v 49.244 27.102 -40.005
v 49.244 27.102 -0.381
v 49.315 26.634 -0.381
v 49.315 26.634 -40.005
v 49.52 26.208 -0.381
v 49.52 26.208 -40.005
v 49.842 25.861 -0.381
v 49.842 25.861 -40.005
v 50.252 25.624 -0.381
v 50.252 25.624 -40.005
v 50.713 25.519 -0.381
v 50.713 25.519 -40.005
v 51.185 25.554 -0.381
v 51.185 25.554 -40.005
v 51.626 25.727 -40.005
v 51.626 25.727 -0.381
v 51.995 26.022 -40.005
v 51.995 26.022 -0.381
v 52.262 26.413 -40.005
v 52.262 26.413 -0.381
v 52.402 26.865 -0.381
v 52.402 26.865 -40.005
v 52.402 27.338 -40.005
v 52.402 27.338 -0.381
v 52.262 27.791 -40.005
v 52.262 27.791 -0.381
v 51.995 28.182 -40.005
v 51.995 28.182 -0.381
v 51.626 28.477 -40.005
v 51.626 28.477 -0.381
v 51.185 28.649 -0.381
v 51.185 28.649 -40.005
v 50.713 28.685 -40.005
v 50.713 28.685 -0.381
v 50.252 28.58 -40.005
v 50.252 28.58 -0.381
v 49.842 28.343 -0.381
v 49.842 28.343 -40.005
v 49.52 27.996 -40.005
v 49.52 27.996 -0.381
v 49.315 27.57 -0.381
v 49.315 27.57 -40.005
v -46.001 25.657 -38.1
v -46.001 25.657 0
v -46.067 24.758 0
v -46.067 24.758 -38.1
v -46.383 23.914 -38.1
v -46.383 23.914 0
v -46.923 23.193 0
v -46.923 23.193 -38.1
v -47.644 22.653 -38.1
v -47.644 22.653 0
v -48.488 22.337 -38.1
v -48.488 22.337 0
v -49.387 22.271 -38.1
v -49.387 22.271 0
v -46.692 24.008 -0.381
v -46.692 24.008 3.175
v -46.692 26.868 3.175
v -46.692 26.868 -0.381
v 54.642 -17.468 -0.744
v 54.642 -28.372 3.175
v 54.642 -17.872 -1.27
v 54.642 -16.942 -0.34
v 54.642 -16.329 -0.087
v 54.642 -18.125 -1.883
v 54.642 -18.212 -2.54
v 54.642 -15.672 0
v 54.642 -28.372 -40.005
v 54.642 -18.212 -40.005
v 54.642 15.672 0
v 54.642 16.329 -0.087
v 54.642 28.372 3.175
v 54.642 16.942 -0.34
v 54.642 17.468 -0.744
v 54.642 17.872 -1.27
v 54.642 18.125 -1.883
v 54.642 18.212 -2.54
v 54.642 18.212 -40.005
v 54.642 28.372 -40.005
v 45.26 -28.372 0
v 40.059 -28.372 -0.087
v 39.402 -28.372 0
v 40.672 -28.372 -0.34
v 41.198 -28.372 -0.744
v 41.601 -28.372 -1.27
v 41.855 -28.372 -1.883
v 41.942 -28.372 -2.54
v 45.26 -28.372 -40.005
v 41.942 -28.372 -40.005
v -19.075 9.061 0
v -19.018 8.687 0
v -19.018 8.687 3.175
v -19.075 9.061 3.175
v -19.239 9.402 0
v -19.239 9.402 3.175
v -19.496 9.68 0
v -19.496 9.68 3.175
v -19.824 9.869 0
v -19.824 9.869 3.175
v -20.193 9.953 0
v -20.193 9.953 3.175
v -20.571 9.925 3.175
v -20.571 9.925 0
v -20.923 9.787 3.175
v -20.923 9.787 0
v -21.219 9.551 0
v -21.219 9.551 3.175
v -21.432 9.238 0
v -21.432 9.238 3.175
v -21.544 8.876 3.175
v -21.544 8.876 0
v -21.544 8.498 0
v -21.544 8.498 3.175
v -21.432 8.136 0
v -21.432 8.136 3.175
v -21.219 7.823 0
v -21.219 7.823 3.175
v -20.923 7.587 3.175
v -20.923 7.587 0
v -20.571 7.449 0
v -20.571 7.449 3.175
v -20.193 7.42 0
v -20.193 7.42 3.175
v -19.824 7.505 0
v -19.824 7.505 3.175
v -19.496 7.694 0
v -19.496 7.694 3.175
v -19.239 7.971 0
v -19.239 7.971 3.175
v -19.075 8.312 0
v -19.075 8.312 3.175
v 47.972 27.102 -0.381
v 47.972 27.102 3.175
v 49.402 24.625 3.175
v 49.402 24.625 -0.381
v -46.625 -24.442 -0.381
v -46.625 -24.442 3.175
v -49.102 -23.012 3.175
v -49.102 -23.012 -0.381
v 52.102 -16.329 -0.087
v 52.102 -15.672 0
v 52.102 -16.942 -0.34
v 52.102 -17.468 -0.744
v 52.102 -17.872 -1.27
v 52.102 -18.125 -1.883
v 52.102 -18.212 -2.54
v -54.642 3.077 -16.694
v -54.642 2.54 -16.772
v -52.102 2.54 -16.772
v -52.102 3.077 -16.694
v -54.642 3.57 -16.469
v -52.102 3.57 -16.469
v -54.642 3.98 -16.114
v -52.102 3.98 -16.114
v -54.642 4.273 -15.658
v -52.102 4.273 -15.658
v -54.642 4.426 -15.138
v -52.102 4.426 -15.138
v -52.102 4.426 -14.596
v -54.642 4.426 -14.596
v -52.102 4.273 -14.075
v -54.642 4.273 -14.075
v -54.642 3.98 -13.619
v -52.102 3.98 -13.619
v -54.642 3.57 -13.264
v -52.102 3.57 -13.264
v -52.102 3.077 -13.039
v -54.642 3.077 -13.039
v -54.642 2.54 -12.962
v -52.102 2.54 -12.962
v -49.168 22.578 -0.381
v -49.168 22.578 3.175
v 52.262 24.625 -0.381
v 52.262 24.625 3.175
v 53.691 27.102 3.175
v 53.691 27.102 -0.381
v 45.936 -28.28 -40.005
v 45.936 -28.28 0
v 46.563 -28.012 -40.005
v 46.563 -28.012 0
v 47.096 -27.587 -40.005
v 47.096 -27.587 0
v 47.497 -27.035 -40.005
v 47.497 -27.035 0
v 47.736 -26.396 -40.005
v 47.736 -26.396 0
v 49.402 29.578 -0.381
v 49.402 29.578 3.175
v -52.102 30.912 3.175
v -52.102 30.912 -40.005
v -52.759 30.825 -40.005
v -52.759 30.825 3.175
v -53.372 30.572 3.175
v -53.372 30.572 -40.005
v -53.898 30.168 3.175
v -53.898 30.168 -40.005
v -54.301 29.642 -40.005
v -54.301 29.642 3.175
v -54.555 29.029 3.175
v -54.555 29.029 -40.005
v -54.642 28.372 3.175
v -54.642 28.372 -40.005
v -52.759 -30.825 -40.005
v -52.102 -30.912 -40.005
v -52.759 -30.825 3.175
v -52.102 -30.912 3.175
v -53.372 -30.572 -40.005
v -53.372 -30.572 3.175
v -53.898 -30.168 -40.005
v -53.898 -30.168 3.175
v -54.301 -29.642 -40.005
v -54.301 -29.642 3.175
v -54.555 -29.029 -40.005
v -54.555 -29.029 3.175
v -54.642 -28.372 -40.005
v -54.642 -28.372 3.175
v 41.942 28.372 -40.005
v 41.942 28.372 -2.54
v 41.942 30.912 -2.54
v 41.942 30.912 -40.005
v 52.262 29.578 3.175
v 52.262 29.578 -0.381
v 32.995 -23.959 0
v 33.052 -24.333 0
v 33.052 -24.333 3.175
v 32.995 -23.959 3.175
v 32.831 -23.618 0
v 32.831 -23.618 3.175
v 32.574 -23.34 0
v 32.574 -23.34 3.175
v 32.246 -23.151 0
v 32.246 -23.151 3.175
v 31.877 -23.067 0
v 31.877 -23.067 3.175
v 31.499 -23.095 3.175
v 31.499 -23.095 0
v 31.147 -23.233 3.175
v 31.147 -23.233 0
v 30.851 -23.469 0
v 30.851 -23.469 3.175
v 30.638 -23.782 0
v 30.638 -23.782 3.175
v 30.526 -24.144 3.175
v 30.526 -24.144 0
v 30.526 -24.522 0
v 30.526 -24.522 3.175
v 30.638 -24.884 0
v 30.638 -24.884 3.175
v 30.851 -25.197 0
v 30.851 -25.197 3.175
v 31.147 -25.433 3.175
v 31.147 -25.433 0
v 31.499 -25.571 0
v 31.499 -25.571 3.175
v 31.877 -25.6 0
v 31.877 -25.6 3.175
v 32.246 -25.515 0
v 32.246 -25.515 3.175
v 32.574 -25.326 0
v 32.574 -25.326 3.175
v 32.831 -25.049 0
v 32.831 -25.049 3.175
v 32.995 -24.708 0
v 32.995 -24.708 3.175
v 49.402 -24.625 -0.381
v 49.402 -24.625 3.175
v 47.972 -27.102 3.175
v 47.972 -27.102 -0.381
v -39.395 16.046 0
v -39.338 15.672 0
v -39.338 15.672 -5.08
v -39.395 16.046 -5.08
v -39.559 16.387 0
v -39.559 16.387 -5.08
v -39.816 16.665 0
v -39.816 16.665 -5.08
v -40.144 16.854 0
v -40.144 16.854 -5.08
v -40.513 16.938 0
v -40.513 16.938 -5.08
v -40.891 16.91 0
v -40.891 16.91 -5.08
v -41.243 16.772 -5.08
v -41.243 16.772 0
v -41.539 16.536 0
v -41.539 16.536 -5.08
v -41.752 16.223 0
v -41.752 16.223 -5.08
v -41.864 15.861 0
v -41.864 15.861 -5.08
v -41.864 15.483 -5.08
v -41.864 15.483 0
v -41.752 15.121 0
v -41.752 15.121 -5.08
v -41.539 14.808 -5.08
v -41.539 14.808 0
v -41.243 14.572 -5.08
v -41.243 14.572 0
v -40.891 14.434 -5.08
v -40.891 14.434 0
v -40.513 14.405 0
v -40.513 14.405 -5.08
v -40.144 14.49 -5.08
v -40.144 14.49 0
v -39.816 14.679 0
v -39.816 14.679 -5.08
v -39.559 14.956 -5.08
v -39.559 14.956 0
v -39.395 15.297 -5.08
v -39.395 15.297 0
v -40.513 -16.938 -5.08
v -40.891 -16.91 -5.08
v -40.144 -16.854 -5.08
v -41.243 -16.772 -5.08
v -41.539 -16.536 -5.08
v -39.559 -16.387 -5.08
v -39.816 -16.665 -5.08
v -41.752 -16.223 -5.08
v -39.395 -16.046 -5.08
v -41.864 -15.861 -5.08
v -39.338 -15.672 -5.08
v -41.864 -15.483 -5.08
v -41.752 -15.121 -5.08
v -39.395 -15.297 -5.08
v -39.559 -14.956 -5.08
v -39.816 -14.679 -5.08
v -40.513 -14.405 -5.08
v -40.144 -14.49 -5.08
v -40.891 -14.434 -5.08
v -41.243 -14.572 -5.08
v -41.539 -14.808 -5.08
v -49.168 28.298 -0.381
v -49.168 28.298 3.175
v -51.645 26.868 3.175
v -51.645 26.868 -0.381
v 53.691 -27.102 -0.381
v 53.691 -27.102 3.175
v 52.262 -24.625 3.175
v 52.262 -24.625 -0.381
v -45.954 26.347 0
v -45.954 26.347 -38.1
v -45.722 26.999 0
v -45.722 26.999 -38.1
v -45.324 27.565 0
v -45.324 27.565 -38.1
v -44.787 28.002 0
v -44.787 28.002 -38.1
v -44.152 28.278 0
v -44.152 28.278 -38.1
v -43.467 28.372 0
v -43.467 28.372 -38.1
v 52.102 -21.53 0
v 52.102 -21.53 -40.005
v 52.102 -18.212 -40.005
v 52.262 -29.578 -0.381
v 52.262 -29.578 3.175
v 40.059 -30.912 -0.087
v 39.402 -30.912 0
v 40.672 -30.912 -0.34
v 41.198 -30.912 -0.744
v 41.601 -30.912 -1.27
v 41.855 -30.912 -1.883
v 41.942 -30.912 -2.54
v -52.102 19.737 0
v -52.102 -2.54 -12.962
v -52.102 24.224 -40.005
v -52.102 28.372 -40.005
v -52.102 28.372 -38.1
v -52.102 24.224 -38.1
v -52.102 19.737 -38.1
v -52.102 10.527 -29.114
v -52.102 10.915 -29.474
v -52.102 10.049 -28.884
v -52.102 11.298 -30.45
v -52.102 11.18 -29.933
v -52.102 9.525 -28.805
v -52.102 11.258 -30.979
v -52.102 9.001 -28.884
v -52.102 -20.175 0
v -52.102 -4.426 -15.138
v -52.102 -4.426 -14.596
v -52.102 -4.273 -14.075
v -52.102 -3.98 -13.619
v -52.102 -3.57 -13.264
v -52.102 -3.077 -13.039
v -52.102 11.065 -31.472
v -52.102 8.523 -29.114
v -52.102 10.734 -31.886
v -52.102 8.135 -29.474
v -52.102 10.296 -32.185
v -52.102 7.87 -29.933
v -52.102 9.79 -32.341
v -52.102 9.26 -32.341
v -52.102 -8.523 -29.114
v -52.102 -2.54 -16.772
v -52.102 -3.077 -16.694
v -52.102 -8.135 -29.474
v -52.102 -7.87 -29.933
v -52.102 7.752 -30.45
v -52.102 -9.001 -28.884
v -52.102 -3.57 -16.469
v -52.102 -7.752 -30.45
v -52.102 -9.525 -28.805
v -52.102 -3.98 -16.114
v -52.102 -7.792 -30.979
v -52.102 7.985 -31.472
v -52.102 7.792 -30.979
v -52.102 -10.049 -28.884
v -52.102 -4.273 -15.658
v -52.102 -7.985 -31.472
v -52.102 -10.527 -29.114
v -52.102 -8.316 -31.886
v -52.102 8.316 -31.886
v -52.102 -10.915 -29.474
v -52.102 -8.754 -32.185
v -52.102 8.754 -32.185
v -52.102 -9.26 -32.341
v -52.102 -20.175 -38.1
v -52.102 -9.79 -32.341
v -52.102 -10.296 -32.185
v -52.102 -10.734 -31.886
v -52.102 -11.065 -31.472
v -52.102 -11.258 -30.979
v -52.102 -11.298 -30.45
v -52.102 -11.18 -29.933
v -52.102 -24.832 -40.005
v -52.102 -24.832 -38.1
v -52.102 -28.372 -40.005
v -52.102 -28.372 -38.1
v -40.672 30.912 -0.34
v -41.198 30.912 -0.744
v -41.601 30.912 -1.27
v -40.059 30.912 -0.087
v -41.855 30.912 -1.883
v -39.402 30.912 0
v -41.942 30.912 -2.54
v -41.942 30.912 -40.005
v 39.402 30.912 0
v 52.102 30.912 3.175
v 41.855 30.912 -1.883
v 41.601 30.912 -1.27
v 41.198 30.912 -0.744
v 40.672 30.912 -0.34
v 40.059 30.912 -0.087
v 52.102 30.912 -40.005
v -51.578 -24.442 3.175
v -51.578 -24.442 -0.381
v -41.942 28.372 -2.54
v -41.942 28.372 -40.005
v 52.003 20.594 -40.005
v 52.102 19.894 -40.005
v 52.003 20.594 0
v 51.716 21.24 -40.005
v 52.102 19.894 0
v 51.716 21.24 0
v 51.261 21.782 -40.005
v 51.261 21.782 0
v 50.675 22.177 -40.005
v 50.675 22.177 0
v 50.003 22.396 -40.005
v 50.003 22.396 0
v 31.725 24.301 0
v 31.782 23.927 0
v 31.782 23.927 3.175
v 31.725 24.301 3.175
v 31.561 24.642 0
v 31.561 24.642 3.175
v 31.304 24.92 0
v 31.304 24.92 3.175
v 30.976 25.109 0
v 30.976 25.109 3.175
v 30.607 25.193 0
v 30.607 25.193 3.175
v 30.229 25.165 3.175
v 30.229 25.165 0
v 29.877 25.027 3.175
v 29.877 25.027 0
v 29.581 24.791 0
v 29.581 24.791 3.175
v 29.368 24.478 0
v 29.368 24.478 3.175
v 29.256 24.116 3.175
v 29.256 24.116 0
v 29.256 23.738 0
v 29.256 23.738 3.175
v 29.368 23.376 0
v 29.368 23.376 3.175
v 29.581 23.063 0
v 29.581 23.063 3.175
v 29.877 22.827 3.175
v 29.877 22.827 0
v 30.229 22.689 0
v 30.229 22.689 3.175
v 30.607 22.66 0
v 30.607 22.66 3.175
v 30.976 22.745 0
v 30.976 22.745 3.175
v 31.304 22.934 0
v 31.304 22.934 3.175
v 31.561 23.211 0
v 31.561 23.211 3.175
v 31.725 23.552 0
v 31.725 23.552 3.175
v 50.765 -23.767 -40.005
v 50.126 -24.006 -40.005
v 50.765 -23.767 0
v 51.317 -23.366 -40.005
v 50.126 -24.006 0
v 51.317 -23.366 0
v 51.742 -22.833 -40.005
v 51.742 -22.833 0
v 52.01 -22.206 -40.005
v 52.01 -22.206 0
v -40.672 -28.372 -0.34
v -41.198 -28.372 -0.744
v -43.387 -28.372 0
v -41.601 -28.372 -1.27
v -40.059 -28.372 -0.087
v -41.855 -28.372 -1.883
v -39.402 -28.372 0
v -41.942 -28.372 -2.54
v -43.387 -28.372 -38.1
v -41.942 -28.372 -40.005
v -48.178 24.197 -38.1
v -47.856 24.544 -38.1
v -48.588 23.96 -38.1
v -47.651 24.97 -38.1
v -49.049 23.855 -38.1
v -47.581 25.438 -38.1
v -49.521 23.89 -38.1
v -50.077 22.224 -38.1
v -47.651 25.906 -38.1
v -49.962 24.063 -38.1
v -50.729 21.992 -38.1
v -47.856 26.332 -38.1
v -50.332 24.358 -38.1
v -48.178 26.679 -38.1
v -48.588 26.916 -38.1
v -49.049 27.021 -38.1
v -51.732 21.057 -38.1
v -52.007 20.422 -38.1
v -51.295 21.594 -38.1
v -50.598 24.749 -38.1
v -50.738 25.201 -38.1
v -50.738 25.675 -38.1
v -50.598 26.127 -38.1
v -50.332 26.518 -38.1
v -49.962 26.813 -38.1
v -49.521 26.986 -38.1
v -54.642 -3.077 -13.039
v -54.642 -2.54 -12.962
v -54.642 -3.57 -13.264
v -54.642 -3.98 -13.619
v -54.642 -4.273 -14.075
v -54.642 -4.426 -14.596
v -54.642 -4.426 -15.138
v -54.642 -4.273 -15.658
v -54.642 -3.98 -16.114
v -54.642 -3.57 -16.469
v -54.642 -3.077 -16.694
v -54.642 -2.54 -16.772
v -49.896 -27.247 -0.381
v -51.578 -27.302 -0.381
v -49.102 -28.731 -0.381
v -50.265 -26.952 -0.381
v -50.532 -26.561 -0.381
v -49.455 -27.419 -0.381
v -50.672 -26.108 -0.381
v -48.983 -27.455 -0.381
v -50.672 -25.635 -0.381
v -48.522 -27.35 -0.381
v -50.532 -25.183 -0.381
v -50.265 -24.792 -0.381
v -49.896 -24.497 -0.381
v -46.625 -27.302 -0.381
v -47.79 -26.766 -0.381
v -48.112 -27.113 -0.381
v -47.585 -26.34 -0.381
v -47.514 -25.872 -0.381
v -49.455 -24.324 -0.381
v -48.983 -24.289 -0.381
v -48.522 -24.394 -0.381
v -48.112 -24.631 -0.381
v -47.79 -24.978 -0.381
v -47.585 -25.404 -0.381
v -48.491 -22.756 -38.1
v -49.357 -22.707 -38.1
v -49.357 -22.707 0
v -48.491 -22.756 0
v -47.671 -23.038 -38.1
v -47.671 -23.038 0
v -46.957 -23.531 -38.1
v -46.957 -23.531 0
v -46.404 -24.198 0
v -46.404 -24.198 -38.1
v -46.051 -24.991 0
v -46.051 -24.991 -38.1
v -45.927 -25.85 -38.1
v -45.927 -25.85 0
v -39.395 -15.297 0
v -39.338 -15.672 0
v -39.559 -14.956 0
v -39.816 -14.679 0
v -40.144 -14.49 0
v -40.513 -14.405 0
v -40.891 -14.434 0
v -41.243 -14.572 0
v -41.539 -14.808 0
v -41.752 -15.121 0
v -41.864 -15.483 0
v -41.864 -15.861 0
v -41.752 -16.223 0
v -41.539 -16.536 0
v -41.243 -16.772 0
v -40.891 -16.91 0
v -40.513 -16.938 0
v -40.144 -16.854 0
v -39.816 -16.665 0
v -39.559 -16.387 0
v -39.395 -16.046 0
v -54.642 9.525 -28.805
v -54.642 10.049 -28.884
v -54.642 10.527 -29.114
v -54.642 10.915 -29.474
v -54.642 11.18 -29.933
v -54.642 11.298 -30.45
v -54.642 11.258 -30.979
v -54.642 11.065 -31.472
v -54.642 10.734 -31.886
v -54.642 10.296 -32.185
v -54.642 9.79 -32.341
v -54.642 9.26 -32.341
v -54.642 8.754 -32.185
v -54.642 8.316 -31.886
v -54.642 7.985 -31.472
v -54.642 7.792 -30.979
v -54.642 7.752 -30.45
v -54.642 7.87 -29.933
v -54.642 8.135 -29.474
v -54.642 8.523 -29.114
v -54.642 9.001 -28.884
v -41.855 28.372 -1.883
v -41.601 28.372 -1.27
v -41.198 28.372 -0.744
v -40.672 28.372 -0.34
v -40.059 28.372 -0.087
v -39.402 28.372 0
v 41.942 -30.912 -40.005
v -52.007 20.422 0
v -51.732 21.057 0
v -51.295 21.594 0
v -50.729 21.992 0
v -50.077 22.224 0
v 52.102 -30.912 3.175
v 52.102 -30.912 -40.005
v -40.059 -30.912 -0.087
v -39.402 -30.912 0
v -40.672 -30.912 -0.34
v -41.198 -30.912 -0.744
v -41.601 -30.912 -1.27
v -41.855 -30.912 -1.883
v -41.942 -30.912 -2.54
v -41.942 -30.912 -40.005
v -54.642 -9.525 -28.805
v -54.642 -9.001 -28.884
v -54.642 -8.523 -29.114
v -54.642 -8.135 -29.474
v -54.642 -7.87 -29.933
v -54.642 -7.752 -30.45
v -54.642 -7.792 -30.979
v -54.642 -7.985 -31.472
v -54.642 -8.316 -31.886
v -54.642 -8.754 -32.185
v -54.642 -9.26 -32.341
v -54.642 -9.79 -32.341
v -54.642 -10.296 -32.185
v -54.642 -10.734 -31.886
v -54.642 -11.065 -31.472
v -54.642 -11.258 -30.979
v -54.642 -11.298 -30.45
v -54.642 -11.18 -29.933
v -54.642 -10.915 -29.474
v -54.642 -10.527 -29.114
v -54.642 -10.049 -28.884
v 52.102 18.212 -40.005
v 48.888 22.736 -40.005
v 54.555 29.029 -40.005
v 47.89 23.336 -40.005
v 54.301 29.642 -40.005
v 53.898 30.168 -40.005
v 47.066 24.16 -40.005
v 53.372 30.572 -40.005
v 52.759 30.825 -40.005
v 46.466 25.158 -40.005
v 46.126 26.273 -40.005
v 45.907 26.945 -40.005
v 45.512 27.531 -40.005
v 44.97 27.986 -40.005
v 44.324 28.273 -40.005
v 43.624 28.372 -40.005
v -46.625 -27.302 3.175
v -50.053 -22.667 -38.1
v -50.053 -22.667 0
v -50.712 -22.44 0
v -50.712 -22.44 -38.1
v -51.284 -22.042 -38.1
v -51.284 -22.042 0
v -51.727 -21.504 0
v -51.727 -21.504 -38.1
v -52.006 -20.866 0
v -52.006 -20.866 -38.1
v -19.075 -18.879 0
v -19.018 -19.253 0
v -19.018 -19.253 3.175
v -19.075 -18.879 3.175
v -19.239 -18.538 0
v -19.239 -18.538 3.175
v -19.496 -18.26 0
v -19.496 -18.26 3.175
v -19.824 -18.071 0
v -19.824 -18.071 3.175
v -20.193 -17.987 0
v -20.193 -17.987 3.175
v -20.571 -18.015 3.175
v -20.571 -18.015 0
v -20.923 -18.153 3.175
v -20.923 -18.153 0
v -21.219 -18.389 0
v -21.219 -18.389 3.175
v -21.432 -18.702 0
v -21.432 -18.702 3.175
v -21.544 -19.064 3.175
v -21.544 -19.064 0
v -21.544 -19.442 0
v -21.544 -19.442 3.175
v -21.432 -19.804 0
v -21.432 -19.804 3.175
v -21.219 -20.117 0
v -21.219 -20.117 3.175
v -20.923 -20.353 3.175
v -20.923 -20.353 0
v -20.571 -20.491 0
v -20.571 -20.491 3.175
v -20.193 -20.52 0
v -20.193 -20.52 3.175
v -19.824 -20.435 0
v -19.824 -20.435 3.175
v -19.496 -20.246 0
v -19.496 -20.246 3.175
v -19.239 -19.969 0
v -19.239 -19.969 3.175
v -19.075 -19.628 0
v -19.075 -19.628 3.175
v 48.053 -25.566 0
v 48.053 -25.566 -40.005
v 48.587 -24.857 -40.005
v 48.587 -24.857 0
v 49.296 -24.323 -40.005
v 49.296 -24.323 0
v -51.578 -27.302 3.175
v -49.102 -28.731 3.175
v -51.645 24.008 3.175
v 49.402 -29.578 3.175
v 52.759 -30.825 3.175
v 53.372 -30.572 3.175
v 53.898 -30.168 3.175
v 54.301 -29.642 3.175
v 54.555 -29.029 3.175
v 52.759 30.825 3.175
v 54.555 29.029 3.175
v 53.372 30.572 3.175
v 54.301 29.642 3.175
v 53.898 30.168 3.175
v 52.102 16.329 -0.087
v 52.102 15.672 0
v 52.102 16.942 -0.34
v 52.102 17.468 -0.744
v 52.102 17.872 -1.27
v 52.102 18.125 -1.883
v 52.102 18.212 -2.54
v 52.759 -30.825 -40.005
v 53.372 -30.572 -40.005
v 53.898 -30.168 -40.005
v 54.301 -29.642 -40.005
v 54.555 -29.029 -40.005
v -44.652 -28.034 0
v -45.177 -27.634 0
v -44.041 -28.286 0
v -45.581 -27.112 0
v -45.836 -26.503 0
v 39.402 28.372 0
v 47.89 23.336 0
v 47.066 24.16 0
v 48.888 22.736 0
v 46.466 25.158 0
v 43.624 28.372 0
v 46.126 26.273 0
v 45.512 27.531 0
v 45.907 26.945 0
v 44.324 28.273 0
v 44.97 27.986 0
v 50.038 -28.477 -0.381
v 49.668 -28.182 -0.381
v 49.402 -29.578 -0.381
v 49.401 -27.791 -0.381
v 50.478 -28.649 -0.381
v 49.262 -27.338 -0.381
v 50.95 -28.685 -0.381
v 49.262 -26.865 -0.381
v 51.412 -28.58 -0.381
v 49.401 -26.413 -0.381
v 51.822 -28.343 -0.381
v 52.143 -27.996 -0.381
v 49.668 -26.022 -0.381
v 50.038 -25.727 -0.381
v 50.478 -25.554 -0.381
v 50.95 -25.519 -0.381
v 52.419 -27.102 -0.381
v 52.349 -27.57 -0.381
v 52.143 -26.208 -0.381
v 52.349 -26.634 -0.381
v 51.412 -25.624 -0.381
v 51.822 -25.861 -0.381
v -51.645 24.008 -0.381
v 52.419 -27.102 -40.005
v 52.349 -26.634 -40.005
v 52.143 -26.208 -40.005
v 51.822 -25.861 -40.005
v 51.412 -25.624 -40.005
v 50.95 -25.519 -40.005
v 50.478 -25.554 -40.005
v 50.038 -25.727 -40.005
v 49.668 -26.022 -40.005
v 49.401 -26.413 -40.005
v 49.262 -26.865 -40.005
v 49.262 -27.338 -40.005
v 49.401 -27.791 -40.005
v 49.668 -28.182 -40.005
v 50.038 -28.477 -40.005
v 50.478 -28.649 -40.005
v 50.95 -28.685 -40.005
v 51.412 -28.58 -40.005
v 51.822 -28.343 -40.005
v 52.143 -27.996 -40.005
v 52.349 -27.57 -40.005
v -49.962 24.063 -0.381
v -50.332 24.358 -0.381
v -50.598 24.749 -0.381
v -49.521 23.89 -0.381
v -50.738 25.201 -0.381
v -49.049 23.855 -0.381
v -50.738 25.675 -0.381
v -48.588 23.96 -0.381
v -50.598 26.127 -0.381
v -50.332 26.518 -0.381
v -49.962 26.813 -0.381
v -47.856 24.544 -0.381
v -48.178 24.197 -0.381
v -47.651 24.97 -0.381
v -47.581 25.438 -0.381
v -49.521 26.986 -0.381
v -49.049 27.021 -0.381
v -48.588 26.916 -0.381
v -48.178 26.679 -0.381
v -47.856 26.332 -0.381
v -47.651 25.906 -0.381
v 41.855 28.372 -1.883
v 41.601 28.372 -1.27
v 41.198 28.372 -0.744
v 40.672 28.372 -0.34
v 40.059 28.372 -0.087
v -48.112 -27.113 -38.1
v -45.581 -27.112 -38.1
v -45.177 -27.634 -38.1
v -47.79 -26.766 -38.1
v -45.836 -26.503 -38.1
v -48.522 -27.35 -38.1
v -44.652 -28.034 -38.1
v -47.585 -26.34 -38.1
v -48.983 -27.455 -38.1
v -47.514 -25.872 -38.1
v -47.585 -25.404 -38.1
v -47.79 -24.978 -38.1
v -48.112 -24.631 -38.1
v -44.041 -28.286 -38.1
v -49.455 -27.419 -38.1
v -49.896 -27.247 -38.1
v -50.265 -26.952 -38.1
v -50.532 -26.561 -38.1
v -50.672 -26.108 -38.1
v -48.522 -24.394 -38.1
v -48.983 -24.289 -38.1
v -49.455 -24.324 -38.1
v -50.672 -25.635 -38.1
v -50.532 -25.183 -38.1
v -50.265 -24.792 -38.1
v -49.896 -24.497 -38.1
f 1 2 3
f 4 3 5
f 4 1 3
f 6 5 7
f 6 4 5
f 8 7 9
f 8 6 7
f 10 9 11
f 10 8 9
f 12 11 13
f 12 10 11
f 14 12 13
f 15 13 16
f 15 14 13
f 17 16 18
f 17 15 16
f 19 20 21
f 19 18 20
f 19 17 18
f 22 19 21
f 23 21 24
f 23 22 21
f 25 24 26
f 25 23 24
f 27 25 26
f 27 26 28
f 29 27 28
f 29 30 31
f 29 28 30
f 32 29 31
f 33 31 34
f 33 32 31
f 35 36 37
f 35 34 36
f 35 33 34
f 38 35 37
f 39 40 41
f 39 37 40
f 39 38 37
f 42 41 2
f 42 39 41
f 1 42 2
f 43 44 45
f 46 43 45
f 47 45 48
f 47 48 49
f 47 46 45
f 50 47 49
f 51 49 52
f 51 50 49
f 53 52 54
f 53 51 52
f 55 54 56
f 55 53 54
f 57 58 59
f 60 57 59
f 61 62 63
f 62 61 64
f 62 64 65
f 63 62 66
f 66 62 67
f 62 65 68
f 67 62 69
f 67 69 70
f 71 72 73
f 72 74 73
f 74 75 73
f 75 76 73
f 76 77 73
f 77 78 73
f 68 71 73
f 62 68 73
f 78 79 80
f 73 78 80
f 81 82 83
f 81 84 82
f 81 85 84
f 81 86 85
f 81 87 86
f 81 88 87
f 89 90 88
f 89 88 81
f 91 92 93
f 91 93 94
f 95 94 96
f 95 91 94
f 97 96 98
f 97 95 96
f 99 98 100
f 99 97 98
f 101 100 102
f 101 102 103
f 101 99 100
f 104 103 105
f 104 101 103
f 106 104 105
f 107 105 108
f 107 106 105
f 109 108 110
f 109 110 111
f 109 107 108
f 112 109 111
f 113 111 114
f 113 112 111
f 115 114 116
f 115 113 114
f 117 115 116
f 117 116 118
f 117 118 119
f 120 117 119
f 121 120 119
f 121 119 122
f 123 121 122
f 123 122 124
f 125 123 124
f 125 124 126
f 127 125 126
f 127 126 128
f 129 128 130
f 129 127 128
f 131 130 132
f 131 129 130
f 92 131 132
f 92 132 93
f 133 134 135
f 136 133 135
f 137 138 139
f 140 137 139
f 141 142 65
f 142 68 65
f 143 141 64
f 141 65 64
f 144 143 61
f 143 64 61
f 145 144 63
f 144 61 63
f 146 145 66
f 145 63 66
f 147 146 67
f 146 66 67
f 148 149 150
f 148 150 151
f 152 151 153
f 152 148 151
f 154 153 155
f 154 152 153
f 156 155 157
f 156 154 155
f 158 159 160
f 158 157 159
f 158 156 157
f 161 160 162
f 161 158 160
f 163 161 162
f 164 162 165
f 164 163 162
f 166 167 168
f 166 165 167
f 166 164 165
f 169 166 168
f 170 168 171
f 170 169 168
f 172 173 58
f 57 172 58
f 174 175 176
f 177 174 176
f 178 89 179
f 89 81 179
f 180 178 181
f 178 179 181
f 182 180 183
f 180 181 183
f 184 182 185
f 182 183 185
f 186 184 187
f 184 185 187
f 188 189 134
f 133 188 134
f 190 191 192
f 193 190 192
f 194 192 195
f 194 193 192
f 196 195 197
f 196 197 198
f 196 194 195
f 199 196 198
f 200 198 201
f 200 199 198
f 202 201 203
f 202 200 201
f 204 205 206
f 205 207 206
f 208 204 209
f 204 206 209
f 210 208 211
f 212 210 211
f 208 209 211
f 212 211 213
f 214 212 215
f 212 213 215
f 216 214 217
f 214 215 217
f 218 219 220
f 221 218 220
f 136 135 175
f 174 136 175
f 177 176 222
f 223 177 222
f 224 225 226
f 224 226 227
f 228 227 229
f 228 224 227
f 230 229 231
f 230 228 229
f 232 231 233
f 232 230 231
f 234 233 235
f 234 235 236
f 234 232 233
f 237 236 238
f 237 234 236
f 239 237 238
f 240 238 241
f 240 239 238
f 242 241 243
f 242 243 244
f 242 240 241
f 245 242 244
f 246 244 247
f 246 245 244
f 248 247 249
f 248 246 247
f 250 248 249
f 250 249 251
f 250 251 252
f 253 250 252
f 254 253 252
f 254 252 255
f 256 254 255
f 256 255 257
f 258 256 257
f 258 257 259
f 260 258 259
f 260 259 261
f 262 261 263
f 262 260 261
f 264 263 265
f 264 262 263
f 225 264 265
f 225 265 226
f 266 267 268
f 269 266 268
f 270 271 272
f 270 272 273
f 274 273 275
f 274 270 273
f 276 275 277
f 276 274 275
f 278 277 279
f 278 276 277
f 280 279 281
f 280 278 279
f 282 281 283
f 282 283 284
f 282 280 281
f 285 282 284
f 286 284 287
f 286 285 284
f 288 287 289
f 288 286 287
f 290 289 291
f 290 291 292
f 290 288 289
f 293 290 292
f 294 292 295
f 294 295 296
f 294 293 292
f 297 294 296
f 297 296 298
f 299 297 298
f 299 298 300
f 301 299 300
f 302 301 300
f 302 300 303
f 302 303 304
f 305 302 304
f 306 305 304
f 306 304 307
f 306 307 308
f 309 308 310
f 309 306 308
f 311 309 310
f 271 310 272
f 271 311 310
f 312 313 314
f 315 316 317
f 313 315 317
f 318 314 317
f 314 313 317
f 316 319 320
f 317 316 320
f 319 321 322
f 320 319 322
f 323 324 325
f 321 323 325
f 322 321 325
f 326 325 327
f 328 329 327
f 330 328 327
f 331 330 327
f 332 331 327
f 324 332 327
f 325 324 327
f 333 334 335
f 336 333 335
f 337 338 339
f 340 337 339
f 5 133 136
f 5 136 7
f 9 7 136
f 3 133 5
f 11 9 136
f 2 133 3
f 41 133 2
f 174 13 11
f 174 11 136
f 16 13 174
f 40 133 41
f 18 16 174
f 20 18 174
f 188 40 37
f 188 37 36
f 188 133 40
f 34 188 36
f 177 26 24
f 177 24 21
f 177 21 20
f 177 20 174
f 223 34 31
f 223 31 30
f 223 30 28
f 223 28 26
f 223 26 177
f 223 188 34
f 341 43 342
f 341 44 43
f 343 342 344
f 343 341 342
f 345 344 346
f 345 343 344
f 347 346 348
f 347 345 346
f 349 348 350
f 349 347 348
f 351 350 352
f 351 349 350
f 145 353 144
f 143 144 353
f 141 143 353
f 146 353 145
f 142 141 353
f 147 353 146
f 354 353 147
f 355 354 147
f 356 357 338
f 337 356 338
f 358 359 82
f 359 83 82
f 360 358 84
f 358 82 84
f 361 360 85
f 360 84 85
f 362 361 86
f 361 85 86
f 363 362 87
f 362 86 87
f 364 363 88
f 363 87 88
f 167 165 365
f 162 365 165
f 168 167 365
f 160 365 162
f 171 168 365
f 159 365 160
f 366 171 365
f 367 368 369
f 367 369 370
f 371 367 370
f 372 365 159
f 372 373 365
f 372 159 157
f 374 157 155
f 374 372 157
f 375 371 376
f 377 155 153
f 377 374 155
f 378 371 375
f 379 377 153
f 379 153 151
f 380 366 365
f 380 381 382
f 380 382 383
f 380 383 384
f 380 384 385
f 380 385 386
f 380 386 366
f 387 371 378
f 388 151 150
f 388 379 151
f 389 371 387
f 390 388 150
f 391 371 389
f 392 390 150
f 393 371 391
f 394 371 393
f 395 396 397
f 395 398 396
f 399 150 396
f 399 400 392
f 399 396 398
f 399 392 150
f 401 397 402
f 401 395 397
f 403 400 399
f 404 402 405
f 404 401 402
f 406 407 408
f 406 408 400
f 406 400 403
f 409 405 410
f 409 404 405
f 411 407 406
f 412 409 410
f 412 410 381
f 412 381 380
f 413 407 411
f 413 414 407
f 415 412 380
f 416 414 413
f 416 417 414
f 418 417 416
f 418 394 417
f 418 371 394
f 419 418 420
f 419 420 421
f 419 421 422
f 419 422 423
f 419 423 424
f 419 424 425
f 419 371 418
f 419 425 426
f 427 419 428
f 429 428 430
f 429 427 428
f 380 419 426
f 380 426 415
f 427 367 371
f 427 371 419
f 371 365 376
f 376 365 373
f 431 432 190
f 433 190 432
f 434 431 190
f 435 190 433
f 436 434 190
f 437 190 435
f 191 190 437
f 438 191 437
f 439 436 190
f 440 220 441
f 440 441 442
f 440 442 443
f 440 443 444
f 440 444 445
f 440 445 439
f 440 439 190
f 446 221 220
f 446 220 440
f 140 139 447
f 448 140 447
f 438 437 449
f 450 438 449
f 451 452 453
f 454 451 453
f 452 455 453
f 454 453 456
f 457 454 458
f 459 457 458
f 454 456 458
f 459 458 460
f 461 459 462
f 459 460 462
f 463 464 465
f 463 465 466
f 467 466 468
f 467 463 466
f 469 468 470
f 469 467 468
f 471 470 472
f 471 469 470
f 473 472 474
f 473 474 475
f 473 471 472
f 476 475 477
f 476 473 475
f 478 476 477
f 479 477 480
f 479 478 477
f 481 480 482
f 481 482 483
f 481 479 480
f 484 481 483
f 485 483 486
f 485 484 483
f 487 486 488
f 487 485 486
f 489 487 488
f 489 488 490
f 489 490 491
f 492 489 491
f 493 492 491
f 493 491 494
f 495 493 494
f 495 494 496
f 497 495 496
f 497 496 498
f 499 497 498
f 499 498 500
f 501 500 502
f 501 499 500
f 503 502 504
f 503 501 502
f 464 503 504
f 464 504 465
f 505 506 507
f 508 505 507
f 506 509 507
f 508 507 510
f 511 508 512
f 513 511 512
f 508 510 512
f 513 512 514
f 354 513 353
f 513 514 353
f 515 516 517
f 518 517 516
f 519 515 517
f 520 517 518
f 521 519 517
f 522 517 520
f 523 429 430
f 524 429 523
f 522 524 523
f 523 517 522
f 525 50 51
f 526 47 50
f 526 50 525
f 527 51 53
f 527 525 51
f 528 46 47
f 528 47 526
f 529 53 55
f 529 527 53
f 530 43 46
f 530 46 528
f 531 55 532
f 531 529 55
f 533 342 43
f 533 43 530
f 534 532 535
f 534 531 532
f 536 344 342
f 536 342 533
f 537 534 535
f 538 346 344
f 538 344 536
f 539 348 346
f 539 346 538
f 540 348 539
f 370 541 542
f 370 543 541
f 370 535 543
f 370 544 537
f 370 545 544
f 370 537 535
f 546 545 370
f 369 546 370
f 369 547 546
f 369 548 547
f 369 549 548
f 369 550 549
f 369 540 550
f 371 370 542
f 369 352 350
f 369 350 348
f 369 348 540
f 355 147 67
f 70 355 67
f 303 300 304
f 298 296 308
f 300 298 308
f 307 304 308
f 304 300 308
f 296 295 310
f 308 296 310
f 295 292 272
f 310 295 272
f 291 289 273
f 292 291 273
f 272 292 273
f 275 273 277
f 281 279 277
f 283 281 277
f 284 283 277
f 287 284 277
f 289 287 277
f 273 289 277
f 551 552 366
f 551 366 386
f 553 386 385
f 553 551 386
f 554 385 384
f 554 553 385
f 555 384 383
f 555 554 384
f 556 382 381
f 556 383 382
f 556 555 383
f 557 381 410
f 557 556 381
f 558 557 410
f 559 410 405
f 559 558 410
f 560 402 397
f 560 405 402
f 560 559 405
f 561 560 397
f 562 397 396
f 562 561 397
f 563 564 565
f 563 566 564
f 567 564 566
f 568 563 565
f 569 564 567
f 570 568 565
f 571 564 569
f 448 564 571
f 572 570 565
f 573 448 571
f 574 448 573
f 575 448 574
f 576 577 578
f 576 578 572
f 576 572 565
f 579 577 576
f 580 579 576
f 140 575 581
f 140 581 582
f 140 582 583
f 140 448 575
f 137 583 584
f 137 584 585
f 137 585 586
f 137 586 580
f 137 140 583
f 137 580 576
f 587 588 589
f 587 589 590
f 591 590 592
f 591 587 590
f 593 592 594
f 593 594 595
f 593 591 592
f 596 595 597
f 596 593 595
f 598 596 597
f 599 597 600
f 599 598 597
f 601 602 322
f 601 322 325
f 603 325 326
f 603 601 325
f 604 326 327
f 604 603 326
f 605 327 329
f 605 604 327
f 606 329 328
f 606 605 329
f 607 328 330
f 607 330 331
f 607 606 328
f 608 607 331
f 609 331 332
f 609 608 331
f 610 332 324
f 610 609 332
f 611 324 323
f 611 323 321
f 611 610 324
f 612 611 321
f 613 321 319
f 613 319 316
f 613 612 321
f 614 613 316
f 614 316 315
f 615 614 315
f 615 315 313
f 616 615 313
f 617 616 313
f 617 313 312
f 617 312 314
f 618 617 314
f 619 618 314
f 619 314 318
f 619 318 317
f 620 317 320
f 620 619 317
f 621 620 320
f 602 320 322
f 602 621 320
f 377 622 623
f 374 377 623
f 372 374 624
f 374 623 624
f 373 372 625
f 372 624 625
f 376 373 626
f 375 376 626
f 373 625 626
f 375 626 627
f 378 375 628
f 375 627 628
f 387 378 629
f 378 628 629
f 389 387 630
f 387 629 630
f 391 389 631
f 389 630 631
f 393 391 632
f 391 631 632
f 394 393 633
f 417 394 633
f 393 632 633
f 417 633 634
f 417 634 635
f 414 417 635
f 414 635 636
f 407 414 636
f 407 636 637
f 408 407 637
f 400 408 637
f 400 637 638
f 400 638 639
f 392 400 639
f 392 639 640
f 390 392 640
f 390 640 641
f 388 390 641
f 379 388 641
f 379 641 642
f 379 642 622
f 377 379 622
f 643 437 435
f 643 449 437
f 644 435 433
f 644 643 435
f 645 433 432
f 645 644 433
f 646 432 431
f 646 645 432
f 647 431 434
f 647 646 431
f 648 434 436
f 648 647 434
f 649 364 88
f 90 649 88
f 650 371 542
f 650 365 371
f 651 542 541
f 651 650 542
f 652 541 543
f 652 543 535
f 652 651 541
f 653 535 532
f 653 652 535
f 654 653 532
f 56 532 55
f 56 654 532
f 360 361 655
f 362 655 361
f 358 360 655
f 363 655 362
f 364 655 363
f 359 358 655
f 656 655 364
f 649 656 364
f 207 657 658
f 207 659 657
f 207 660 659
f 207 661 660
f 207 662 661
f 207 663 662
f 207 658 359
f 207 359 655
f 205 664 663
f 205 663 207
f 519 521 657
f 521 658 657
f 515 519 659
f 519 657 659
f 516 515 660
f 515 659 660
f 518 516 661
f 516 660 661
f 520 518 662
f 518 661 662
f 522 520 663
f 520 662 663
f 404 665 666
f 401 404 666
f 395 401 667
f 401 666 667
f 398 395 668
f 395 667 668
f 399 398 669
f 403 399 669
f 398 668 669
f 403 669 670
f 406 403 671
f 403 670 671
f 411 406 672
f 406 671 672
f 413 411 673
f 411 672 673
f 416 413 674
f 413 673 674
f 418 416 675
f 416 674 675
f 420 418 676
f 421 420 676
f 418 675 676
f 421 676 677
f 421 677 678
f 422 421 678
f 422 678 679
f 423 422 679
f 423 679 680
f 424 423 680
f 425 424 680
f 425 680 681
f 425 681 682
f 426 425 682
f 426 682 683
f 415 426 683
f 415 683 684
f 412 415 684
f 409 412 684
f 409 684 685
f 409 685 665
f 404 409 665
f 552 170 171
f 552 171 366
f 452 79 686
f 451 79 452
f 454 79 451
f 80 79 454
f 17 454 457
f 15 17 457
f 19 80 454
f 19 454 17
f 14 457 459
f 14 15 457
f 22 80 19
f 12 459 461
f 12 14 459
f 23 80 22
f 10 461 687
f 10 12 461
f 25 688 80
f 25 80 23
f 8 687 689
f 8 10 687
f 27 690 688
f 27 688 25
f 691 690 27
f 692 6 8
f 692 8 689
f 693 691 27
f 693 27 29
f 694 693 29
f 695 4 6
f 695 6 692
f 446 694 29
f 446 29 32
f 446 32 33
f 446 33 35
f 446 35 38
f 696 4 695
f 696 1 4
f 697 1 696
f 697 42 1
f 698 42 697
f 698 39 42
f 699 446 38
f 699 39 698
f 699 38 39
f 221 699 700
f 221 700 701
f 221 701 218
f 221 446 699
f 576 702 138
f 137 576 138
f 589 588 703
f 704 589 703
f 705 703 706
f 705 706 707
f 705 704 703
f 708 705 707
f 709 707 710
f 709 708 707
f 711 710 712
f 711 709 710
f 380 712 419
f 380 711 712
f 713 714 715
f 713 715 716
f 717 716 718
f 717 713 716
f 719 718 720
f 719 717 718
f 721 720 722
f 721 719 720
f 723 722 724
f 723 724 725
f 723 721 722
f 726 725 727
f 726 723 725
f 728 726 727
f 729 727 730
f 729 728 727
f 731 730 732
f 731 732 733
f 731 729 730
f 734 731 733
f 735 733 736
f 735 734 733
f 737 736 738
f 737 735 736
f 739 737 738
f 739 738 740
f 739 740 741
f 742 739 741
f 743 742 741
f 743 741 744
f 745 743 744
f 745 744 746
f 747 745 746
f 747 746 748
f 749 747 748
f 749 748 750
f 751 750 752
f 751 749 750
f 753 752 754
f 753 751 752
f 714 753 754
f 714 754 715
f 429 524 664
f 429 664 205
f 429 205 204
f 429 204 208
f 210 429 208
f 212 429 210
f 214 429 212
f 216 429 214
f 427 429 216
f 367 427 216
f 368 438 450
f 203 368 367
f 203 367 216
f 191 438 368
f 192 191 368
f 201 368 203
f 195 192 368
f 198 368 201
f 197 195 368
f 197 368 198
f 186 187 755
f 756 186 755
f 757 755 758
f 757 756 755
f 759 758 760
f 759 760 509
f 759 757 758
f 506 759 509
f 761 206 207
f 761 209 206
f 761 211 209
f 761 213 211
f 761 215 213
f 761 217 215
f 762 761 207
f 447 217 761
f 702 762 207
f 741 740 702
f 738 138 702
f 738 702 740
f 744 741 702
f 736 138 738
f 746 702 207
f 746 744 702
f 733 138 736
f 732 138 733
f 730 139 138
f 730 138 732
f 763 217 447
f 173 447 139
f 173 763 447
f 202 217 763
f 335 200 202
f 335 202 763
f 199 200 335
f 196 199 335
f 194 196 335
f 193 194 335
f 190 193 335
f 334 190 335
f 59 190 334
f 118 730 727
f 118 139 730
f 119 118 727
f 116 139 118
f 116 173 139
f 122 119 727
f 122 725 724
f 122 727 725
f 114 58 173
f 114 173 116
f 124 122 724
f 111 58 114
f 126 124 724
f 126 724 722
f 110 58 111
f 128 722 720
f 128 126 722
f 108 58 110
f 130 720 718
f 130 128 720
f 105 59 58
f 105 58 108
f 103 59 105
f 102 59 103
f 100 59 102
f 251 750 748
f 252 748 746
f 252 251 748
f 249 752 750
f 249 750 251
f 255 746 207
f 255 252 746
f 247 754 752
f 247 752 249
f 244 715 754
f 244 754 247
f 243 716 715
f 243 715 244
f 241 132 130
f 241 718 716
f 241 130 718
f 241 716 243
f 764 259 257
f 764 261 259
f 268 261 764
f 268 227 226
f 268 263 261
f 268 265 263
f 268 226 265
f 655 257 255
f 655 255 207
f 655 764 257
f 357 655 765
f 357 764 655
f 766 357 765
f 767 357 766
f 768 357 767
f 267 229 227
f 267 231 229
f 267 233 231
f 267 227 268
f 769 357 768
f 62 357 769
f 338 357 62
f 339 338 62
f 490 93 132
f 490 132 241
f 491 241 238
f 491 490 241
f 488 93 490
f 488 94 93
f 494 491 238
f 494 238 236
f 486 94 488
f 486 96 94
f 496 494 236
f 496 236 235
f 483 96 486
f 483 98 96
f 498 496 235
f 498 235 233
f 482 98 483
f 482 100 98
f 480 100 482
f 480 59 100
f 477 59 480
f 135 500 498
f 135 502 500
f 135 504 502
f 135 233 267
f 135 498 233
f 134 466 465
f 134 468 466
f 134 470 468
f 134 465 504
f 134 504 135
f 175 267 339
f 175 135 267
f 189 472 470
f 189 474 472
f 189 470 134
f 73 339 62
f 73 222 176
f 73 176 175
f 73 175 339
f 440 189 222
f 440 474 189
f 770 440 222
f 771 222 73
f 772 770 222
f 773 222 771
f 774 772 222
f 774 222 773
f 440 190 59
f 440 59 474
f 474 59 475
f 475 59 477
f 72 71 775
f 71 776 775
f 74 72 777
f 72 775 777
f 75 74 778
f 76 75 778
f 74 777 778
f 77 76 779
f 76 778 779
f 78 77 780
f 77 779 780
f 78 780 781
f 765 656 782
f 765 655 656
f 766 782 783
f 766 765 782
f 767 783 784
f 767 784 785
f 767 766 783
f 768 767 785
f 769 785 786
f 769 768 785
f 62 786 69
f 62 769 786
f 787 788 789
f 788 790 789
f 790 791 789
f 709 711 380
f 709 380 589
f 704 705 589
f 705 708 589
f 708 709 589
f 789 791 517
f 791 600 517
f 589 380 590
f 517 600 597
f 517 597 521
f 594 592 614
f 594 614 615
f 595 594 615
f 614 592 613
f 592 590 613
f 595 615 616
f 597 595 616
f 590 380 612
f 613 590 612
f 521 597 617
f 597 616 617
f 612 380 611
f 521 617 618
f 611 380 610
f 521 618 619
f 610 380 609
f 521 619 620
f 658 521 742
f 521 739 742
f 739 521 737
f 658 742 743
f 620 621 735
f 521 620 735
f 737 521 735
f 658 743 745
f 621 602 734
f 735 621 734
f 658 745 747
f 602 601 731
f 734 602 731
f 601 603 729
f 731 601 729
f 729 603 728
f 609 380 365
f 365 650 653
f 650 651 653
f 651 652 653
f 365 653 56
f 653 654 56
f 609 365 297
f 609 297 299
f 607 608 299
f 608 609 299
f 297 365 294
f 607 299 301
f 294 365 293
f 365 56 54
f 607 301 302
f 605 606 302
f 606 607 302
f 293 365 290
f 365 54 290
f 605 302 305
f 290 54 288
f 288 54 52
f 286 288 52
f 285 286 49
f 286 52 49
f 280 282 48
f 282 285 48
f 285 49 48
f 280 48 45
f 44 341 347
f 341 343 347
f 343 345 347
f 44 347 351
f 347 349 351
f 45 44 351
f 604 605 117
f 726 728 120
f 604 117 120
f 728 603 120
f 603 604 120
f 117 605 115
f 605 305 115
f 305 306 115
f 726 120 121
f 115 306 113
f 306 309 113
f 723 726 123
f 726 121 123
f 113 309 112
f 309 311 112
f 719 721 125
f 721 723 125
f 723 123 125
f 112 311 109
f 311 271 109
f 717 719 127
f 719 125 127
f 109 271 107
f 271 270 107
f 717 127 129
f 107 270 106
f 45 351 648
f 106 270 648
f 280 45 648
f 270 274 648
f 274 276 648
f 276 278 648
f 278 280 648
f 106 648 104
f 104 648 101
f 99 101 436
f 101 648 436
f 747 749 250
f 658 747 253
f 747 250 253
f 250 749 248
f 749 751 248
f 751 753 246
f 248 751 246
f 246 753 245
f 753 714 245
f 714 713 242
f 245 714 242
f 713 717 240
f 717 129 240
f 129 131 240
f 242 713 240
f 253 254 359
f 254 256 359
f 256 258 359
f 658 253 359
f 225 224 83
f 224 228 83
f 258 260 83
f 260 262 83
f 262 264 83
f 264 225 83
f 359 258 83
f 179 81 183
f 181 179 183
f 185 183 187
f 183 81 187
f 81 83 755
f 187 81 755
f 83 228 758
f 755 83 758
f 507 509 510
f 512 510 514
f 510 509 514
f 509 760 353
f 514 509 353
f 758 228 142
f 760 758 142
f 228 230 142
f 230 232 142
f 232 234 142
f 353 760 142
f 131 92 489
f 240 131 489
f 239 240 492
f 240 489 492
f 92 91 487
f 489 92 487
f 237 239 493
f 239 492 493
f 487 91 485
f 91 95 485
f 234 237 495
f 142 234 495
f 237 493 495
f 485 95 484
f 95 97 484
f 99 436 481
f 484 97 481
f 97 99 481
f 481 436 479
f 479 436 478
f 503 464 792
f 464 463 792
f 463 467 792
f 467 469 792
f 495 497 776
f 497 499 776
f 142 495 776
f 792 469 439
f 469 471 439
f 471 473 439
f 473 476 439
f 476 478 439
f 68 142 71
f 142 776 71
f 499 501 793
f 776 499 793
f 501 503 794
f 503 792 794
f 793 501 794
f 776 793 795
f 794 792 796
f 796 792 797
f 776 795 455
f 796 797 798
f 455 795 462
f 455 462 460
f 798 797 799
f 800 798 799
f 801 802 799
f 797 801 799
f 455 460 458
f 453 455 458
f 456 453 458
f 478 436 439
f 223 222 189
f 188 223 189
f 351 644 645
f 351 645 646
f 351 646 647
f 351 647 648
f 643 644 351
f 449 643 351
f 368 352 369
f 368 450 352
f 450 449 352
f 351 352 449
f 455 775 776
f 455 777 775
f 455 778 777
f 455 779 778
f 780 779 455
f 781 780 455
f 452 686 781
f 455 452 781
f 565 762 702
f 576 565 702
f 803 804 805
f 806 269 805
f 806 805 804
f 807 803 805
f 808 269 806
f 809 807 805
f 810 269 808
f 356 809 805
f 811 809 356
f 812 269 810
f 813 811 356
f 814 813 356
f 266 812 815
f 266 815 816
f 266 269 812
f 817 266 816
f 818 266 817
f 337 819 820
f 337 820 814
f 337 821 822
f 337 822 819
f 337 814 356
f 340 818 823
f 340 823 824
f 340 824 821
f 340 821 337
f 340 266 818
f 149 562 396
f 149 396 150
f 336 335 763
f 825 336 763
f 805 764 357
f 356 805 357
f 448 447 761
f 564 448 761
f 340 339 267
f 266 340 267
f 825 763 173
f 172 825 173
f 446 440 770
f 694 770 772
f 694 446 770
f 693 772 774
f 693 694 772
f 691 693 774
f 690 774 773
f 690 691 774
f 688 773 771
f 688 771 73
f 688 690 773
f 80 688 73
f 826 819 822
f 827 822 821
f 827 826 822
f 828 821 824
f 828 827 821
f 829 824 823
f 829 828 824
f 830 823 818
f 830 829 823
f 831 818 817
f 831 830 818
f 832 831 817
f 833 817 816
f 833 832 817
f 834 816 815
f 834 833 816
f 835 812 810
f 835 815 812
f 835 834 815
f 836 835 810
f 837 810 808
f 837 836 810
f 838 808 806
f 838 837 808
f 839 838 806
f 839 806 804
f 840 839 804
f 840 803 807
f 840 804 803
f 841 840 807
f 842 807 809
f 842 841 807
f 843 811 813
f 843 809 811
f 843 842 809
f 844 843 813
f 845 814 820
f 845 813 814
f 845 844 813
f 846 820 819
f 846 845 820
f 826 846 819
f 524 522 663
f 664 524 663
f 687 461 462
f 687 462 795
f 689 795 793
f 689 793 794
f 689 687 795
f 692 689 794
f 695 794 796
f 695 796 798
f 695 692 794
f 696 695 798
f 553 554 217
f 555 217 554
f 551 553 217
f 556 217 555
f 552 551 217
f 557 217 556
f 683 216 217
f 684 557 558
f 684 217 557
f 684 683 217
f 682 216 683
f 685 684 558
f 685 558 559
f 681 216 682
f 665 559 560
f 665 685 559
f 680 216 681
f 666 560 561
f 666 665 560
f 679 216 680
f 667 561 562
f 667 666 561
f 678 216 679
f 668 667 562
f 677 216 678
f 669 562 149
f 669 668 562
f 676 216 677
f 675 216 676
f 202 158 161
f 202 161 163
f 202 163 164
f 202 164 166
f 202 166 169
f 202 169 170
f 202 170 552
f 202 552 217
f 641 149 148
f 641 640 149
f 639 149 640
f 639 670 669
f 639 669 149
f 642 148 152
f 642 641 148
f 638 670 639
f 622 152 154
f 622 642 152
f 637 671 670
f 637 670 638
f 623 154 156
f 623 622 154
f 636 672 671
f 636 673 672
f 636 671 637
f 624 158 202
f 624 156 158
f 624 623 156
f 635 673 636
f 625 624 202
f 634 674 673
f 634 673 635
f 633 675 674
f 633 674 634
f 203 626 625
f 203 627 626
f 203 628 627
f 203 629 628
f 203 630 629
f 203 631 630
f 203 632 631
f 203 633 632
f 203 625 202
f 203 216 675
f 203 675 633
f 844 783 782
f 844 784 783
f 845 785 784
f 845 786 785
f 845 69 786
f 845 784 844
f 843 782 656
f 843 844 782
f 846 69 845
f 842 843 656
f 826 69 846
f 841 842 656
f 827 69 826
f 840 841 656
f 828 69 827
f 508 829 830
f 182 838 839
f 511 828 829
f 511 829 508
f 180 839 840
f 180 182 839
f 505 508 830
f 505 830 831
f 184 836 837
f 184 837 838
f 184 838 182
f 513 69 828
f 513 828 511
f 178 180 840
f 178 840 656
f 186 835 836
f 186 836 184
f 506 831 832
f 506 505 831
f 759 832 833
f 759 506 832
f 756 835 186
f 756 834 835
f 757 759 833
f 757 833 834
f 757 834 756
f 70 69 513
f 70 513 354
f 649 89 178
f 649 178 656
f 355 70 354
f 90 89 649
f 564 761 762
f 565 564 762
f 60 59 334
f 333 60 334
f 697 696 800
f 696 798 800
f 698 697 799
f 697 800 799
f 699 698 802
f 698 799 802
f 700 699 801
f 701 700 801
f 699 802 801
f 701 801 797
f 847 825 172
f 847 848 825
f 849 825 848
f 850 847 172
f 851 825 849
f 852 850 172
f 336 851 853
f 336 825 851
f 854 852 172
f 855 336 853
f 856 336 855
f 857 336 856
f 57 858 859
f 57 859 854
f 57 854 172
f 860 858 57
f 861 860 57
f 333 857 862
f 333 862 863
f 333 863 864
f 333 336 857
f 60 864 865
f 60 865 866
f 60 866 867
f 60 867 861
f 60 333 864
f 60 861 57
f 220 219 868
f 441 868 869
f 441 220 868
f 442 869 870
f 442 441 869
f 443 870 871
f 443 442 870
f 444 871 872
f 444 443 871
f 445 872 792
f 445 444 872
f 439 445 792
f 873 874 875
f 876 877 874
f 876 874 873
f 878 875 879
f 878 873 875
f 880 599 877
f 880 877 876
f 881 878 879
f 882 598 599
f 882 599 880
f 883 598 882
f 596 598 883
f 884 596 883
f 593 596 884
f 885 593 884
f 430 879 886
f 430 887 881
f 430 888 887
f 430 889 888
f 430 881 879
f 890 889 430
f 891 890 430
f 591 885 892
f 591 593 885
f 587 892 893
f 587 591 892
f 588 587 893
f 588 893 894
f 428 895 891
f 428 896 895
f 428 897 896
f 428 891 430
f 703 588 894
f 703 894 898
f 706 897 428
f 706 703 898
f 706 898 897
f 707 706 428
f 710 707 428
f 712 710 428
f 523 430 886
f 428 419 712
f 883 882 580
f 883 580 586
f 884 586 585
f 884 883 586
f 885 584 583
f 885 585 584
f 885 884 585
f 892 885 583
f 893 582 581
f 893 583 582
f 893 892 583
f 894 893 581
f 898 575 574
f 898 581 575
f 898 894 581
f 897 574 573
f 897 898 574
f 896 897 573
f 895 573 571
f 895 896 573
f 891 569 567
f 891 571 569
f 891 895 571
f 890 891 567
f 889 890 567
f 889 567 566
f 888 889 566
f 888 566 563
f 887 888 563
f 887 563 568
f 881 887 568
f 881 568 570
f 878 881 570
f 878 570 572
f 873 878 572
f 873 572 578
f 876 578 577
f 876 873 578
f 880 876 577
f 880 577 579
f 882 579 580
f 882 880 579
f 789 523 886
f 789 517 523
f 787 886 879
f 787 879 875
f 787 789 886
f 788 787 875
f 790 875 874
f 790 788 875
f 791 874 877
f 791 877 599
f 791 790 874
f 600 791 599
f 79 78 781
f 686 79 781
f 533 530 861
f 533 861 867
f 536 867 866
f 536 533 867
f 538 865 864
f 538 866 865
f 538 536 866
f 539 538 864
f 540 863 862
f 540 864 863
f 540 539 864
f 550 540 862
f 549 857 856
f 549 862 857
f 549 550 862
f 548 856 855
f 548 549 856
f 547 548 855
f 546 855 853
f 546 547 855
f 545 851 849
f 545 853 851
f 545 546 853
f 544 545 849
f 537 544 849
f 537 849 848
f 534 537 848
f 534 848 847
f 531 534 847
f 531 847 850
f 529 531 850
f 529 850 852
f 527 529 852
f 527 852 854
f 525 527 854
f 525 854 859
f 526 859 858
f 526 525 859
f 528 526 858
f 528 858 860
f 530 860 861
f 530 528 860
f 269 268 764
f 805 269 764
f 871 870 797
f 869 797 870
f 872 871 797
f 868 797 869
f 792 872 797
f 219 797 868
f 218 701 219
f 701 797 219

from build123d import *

# Parameters (mm, degrees)
SKETCH1_W           = 109.2835
SKETCH1_H           = 61.8236
SKETCH1_R           = 1.27
SKETCH1_R_2         = 1.5875
BOSS_EXTRUDE1_DEPTH = 3.175
BOSS_EXTRUDE2_START = -40.005
SKETCH3_R           = 1.5875
BOSS_EXTRUDE2_DEPTH = 40.005
SKETCH4_W           = 90.288549843
SKETCH4_H           = 56.7436
CUT_EXTRUDE1_DEPTH  = 1.905
FILLET1_R           = 2.54
SKETCH6_R           = 1.27
BOSS_EXTRUDE3_DEPTH = 5.08
FILLET2_R           = 2.54
SKETCH9_R           = 1.778
CUT_EXTRUDE4_DEPTH  = 3.81
CUT_EXTRUDE5_DEPTH  = 3.556


with BuildPart() as part:
    # Sketch1 → Boss-Extrude1 (new body)
    with BuildSketch(Plane.XY):
        Rectangle(SKETCH1_W, SKETCH1_H)
        with Locations((30.51175, 23.9268)):
            Circle(SKETCH1_R, mode=Mode.SUBTRACT)
        with Locations((-20.28825, 8.6868)):
            Circle(SKETCH1_R, mode=Mode.SUBTRACT)
        with Locations((-20.28825, -19.2532)):
            Circle(SKETCH1_R, mode=Mode.SUBTRACT)
        with Locations((31.78175, -24.3332)):
            Circle(SKETCH1_R, mode=Mode.SUBTRACT)
        with Locations((50.83175, -27.1018)):
            Circle(SKETCH1_R_2, mode=Mode.SUBTRACT)
        with Locations((-49.16805, 25.4381)):
            Circle(SKETCH1_R_2, mode=Mode.SUBTRACT)
        with Locations((-49.10175, -25.8718)):
            Circle(SKETCH1_R_2, mode=Mode.SUBTRACT)
        with Locations(Location((50.83175, 27.1018, 0), (0, 0, 180))):
            Circle(SKETCH1_R_2, mode=Mode.SUBTRACT)
    extrude(amount=BOSS_EXTRUDE1_DEPTH)

    # Sketch3 → Boss-Extrude2 (add)
    # profile 1 of 3: a face of its own
    with BuildSketch(Plane.XY.offset(BOSS_EXTRUDE2_START)):
        with BuildLine():
            Line((-54.64175, 30.9118), (-41.94175, 30.9118))
            Line((-41.94175, 30.9118), (-41.94175, 28.3718))
            Line((-41.94175, 28.3718), (-47.953953912, 28.3718))
            ThreePointArc((-47.953953912, 28.3718), (-46.92298597, 23.19303597), (-52.10175, 24.224003912))
            Line((-52.10175, 24.224003912), (-52.10175, 18.2118))
            Line((-52.10175, 18.2118), (-52.10175, -18.2118))
            Line((-52.10175, -18.2118), (-52.10175, -24.832268856))
            ThreePointArc((-52.10175, -24.832268856), (-47.256776002, -23.28786967), (-47.144551747, -28.3718))
            Line((-47.144551747, -28.3718), (-41.94175, -28.3718))
            Line((-41.94175, -28.3718), (-41.94175, -30.9118))
            Line((-41.94175, -30.9118), (-54.64175, -30.9118))
            Line((-54.64175, -30.9118), (-54.64175, -18.2118))
            Line((-54.64175, -18.2118), (-54.64175, 18.2118))
            Line((-54.64175, 18.2118), (-54.64175, 30.9118))
        make_face()
        with Locations((-49.16805, 25.4381)):
            Circle(SKETCH3_R, mode=Mode.SUBTRACT)
        with Locations((-49.10175, -25.8718)):
            Circle(SKETCH3_R, mode=Mode.SUBTRACT)
    # profile 2 of 3: a face of its own
    with BuildSketch(Plane.XY.offset(BOSS_EXTRUDE2_START)):
        with BuildLine():
            Line((54.64175, 30.9118), (54.64175, 18.2118))
            Line((54.64175, 18.2118), (52.10175, 18.2118))
            Line((52.10175, 18.2118), (52.10175, 22.49507603))
            ThreePointArc((52.10175, 22.49507603), (47.452785237, 23.722835237), (46.22502603, 28.3718))
            Line((46.22502603, 28.3718), (41.94175, 28.3718))
            Line((41.94175, 28.3718), (41.94175, 30.9118))
            Line((41.94175, 30.9118), (54.64175, 30.9118))
        make_face()
        with Locations(Location((50.83175, 27.1018, 0), (0, 0, 180))):
            Circle(SKETCH3_R, mode=Mode.SUBTRACT)
    # profile 3 of 3: a face of its own
    with BuildSketch(Plane.XY.offset(BOSS_EXTRUDE2_START)):
        with BuildLine():
            Line((52.10175, -24.191864434), (52.10175, -18.2118))
            Line((52.10175, -18.2118), (54.64175, -18.2118))
            Line((54.64175, -18.2118), (54.64175, -30.9118))
            Line((54.64175, -30.9118), (41.94175, -30.9118))
            Line((41.94175, -30.9118), (41.94175, -28.3718))
            Line((41.94175, -28.3718), (47.921814434, -28.3718))
            ThreePointArc((47.921814434, -28.3718), (48.58668597, -24.85673597), (52.10175, -24.191864434))
        make_face()
        with Locations((50.83175, -27.1018)):
            Circle(SKETCH3_R, mode=Mode.SUBTRACT)
    extrude(amount=BOSS_EXTRUDE2_DEPTH)

    # Sketch4 → Cut-Extrude1 (cut)
    with BuildSketch(Plane(origin=(0, 0, -40.005), x_dir=(-1, 0, 0), z_dir=(0, 0, -1))):
        with Locations((6.957475078, 0)):
            Rectangle(SKETCH4_W, SKETCH4_H)
    extrude(amount=-CUT_EXTRUDE1_DEPTH, mode=Mode.SUBTRACT)

    # Fillet1
    fillet1_edges = [part.edges().sort_by_distance(p)[0] for p in [
        (52.10175, 22.49507603, -20.0025),
        (46.22502603, 28.3718, -20.0025),
        (-47.144551747, -28.3718, -19.05),
        (-52.10175, -24.832268856, -19.05),
        (-52.10175, 24.224003912, -19.05),
        (-47.953953912, 28.3718, -19.05),
        (-54.64175, 30.9118, -18.415),
        (54.64175, 30.9118, -18.415),
        (54.64175, -30.9118, -18.415),
        (-54.64175, -30.9118, -18.415),
        (47.921814434, -28.3718, -20.0025),
        (52.10175, -24.191864434, -20.0025),
    ]]
    fillet(fillet1_edges, radius=FILLET1_R)

    # Sketch6 → Boss-Extrude3 (add)
    with BuildSketch(Plane.XY):
        with Locations((-40.60825, 15.6718)):
            Circle(SKETCH6_R)
        with Locations((-40.60825, -15.6718)):
            Circle(SKETCH6_R)
    extrude(amount=-BOSS_EXTRUDE3_DEPTH)

    # Fillet2
    fillet2_edges = [part.edges().sort_by_distance(p)[0] for p in [
        (41.94175, 29.6418, 0),
        (53.37175, 18.2118, 0),
        (-41.94175, -29.6418, 0),
        (-41.94175, 29.6418, 0),
        (53.37175, -18.2118, 0),
        (41.94175, -29.6418, 0),
    ]]
    fillet(fillet2_edges, radius=FILLET2_R)

    # Sketch9 → Cut-Extrude4 (cut)
    with BuildSketch(Plane.ZY.offset(54.64175)):
        with Locations((-30.58287, 9.525)):
            Circle(SKETCH9_R)
        with Locations((-30.58287, -9.525)):
            Circle(SKETCH9_R)
        with BuildLine():
            Line((-12.96162, 2.54), (-12.96162, -2.54))
            ThreePointArc((-12.96162, -2.54), (-14.86662, -4.445), (-16.77162, -2.54))
            Line((-16.77162, -2.54), (-16.77162, 2.54))
            ThreePointArc((-16.77162, 2.54), (-14.86662, 4.445), (-12.96162, 2.54))
        make_face()
    extrude(amount=-CUT_EXTRUDE4_DEPTH, mode=Mode.SUBTRACT)

    # Sketch10 → Cut-Extrude5 (cut)
    with BuildSketch(Plane.XY.offset(3.175)):
        Polygon((-49.16805, 28.297715883), (-51.64455, 26.867907942), (-51.64455, 24.008292058), (-49.16805, 22.578484117), (-46.69155, 24.008292058), (-46.69155, 26.867907942), align=None)
        Polygon((-46.62525, -24.441992058), (-49.10175, -23.012184117), (-51.57825, -24.441992058), (-51.57825, -27.301607942), (-49.10175, -28.731415883), (-46.62525, -27.301607942), align=None)
        Polygon((47.972134117, 27.1018), (49.401942058, 24.6253), (52.261557942, 24.6253), (53.691365883, 27.1018), (52.261557942, 29.5783), (49.401942058, 29.5783), align=None)
        Polygon((49.401942058, -24.6253), (47.972134117, -27.1018), (49.401942058, -29.5783), (52.261557942, -29.5783), (53.691365883, -27.1018), (52.261557942, -24.6253), align=None)
    extrude(amount=-CUT_EXTRUDE5_DEPTH, mode=Mode.SUBTRACT)


solid = part.part
